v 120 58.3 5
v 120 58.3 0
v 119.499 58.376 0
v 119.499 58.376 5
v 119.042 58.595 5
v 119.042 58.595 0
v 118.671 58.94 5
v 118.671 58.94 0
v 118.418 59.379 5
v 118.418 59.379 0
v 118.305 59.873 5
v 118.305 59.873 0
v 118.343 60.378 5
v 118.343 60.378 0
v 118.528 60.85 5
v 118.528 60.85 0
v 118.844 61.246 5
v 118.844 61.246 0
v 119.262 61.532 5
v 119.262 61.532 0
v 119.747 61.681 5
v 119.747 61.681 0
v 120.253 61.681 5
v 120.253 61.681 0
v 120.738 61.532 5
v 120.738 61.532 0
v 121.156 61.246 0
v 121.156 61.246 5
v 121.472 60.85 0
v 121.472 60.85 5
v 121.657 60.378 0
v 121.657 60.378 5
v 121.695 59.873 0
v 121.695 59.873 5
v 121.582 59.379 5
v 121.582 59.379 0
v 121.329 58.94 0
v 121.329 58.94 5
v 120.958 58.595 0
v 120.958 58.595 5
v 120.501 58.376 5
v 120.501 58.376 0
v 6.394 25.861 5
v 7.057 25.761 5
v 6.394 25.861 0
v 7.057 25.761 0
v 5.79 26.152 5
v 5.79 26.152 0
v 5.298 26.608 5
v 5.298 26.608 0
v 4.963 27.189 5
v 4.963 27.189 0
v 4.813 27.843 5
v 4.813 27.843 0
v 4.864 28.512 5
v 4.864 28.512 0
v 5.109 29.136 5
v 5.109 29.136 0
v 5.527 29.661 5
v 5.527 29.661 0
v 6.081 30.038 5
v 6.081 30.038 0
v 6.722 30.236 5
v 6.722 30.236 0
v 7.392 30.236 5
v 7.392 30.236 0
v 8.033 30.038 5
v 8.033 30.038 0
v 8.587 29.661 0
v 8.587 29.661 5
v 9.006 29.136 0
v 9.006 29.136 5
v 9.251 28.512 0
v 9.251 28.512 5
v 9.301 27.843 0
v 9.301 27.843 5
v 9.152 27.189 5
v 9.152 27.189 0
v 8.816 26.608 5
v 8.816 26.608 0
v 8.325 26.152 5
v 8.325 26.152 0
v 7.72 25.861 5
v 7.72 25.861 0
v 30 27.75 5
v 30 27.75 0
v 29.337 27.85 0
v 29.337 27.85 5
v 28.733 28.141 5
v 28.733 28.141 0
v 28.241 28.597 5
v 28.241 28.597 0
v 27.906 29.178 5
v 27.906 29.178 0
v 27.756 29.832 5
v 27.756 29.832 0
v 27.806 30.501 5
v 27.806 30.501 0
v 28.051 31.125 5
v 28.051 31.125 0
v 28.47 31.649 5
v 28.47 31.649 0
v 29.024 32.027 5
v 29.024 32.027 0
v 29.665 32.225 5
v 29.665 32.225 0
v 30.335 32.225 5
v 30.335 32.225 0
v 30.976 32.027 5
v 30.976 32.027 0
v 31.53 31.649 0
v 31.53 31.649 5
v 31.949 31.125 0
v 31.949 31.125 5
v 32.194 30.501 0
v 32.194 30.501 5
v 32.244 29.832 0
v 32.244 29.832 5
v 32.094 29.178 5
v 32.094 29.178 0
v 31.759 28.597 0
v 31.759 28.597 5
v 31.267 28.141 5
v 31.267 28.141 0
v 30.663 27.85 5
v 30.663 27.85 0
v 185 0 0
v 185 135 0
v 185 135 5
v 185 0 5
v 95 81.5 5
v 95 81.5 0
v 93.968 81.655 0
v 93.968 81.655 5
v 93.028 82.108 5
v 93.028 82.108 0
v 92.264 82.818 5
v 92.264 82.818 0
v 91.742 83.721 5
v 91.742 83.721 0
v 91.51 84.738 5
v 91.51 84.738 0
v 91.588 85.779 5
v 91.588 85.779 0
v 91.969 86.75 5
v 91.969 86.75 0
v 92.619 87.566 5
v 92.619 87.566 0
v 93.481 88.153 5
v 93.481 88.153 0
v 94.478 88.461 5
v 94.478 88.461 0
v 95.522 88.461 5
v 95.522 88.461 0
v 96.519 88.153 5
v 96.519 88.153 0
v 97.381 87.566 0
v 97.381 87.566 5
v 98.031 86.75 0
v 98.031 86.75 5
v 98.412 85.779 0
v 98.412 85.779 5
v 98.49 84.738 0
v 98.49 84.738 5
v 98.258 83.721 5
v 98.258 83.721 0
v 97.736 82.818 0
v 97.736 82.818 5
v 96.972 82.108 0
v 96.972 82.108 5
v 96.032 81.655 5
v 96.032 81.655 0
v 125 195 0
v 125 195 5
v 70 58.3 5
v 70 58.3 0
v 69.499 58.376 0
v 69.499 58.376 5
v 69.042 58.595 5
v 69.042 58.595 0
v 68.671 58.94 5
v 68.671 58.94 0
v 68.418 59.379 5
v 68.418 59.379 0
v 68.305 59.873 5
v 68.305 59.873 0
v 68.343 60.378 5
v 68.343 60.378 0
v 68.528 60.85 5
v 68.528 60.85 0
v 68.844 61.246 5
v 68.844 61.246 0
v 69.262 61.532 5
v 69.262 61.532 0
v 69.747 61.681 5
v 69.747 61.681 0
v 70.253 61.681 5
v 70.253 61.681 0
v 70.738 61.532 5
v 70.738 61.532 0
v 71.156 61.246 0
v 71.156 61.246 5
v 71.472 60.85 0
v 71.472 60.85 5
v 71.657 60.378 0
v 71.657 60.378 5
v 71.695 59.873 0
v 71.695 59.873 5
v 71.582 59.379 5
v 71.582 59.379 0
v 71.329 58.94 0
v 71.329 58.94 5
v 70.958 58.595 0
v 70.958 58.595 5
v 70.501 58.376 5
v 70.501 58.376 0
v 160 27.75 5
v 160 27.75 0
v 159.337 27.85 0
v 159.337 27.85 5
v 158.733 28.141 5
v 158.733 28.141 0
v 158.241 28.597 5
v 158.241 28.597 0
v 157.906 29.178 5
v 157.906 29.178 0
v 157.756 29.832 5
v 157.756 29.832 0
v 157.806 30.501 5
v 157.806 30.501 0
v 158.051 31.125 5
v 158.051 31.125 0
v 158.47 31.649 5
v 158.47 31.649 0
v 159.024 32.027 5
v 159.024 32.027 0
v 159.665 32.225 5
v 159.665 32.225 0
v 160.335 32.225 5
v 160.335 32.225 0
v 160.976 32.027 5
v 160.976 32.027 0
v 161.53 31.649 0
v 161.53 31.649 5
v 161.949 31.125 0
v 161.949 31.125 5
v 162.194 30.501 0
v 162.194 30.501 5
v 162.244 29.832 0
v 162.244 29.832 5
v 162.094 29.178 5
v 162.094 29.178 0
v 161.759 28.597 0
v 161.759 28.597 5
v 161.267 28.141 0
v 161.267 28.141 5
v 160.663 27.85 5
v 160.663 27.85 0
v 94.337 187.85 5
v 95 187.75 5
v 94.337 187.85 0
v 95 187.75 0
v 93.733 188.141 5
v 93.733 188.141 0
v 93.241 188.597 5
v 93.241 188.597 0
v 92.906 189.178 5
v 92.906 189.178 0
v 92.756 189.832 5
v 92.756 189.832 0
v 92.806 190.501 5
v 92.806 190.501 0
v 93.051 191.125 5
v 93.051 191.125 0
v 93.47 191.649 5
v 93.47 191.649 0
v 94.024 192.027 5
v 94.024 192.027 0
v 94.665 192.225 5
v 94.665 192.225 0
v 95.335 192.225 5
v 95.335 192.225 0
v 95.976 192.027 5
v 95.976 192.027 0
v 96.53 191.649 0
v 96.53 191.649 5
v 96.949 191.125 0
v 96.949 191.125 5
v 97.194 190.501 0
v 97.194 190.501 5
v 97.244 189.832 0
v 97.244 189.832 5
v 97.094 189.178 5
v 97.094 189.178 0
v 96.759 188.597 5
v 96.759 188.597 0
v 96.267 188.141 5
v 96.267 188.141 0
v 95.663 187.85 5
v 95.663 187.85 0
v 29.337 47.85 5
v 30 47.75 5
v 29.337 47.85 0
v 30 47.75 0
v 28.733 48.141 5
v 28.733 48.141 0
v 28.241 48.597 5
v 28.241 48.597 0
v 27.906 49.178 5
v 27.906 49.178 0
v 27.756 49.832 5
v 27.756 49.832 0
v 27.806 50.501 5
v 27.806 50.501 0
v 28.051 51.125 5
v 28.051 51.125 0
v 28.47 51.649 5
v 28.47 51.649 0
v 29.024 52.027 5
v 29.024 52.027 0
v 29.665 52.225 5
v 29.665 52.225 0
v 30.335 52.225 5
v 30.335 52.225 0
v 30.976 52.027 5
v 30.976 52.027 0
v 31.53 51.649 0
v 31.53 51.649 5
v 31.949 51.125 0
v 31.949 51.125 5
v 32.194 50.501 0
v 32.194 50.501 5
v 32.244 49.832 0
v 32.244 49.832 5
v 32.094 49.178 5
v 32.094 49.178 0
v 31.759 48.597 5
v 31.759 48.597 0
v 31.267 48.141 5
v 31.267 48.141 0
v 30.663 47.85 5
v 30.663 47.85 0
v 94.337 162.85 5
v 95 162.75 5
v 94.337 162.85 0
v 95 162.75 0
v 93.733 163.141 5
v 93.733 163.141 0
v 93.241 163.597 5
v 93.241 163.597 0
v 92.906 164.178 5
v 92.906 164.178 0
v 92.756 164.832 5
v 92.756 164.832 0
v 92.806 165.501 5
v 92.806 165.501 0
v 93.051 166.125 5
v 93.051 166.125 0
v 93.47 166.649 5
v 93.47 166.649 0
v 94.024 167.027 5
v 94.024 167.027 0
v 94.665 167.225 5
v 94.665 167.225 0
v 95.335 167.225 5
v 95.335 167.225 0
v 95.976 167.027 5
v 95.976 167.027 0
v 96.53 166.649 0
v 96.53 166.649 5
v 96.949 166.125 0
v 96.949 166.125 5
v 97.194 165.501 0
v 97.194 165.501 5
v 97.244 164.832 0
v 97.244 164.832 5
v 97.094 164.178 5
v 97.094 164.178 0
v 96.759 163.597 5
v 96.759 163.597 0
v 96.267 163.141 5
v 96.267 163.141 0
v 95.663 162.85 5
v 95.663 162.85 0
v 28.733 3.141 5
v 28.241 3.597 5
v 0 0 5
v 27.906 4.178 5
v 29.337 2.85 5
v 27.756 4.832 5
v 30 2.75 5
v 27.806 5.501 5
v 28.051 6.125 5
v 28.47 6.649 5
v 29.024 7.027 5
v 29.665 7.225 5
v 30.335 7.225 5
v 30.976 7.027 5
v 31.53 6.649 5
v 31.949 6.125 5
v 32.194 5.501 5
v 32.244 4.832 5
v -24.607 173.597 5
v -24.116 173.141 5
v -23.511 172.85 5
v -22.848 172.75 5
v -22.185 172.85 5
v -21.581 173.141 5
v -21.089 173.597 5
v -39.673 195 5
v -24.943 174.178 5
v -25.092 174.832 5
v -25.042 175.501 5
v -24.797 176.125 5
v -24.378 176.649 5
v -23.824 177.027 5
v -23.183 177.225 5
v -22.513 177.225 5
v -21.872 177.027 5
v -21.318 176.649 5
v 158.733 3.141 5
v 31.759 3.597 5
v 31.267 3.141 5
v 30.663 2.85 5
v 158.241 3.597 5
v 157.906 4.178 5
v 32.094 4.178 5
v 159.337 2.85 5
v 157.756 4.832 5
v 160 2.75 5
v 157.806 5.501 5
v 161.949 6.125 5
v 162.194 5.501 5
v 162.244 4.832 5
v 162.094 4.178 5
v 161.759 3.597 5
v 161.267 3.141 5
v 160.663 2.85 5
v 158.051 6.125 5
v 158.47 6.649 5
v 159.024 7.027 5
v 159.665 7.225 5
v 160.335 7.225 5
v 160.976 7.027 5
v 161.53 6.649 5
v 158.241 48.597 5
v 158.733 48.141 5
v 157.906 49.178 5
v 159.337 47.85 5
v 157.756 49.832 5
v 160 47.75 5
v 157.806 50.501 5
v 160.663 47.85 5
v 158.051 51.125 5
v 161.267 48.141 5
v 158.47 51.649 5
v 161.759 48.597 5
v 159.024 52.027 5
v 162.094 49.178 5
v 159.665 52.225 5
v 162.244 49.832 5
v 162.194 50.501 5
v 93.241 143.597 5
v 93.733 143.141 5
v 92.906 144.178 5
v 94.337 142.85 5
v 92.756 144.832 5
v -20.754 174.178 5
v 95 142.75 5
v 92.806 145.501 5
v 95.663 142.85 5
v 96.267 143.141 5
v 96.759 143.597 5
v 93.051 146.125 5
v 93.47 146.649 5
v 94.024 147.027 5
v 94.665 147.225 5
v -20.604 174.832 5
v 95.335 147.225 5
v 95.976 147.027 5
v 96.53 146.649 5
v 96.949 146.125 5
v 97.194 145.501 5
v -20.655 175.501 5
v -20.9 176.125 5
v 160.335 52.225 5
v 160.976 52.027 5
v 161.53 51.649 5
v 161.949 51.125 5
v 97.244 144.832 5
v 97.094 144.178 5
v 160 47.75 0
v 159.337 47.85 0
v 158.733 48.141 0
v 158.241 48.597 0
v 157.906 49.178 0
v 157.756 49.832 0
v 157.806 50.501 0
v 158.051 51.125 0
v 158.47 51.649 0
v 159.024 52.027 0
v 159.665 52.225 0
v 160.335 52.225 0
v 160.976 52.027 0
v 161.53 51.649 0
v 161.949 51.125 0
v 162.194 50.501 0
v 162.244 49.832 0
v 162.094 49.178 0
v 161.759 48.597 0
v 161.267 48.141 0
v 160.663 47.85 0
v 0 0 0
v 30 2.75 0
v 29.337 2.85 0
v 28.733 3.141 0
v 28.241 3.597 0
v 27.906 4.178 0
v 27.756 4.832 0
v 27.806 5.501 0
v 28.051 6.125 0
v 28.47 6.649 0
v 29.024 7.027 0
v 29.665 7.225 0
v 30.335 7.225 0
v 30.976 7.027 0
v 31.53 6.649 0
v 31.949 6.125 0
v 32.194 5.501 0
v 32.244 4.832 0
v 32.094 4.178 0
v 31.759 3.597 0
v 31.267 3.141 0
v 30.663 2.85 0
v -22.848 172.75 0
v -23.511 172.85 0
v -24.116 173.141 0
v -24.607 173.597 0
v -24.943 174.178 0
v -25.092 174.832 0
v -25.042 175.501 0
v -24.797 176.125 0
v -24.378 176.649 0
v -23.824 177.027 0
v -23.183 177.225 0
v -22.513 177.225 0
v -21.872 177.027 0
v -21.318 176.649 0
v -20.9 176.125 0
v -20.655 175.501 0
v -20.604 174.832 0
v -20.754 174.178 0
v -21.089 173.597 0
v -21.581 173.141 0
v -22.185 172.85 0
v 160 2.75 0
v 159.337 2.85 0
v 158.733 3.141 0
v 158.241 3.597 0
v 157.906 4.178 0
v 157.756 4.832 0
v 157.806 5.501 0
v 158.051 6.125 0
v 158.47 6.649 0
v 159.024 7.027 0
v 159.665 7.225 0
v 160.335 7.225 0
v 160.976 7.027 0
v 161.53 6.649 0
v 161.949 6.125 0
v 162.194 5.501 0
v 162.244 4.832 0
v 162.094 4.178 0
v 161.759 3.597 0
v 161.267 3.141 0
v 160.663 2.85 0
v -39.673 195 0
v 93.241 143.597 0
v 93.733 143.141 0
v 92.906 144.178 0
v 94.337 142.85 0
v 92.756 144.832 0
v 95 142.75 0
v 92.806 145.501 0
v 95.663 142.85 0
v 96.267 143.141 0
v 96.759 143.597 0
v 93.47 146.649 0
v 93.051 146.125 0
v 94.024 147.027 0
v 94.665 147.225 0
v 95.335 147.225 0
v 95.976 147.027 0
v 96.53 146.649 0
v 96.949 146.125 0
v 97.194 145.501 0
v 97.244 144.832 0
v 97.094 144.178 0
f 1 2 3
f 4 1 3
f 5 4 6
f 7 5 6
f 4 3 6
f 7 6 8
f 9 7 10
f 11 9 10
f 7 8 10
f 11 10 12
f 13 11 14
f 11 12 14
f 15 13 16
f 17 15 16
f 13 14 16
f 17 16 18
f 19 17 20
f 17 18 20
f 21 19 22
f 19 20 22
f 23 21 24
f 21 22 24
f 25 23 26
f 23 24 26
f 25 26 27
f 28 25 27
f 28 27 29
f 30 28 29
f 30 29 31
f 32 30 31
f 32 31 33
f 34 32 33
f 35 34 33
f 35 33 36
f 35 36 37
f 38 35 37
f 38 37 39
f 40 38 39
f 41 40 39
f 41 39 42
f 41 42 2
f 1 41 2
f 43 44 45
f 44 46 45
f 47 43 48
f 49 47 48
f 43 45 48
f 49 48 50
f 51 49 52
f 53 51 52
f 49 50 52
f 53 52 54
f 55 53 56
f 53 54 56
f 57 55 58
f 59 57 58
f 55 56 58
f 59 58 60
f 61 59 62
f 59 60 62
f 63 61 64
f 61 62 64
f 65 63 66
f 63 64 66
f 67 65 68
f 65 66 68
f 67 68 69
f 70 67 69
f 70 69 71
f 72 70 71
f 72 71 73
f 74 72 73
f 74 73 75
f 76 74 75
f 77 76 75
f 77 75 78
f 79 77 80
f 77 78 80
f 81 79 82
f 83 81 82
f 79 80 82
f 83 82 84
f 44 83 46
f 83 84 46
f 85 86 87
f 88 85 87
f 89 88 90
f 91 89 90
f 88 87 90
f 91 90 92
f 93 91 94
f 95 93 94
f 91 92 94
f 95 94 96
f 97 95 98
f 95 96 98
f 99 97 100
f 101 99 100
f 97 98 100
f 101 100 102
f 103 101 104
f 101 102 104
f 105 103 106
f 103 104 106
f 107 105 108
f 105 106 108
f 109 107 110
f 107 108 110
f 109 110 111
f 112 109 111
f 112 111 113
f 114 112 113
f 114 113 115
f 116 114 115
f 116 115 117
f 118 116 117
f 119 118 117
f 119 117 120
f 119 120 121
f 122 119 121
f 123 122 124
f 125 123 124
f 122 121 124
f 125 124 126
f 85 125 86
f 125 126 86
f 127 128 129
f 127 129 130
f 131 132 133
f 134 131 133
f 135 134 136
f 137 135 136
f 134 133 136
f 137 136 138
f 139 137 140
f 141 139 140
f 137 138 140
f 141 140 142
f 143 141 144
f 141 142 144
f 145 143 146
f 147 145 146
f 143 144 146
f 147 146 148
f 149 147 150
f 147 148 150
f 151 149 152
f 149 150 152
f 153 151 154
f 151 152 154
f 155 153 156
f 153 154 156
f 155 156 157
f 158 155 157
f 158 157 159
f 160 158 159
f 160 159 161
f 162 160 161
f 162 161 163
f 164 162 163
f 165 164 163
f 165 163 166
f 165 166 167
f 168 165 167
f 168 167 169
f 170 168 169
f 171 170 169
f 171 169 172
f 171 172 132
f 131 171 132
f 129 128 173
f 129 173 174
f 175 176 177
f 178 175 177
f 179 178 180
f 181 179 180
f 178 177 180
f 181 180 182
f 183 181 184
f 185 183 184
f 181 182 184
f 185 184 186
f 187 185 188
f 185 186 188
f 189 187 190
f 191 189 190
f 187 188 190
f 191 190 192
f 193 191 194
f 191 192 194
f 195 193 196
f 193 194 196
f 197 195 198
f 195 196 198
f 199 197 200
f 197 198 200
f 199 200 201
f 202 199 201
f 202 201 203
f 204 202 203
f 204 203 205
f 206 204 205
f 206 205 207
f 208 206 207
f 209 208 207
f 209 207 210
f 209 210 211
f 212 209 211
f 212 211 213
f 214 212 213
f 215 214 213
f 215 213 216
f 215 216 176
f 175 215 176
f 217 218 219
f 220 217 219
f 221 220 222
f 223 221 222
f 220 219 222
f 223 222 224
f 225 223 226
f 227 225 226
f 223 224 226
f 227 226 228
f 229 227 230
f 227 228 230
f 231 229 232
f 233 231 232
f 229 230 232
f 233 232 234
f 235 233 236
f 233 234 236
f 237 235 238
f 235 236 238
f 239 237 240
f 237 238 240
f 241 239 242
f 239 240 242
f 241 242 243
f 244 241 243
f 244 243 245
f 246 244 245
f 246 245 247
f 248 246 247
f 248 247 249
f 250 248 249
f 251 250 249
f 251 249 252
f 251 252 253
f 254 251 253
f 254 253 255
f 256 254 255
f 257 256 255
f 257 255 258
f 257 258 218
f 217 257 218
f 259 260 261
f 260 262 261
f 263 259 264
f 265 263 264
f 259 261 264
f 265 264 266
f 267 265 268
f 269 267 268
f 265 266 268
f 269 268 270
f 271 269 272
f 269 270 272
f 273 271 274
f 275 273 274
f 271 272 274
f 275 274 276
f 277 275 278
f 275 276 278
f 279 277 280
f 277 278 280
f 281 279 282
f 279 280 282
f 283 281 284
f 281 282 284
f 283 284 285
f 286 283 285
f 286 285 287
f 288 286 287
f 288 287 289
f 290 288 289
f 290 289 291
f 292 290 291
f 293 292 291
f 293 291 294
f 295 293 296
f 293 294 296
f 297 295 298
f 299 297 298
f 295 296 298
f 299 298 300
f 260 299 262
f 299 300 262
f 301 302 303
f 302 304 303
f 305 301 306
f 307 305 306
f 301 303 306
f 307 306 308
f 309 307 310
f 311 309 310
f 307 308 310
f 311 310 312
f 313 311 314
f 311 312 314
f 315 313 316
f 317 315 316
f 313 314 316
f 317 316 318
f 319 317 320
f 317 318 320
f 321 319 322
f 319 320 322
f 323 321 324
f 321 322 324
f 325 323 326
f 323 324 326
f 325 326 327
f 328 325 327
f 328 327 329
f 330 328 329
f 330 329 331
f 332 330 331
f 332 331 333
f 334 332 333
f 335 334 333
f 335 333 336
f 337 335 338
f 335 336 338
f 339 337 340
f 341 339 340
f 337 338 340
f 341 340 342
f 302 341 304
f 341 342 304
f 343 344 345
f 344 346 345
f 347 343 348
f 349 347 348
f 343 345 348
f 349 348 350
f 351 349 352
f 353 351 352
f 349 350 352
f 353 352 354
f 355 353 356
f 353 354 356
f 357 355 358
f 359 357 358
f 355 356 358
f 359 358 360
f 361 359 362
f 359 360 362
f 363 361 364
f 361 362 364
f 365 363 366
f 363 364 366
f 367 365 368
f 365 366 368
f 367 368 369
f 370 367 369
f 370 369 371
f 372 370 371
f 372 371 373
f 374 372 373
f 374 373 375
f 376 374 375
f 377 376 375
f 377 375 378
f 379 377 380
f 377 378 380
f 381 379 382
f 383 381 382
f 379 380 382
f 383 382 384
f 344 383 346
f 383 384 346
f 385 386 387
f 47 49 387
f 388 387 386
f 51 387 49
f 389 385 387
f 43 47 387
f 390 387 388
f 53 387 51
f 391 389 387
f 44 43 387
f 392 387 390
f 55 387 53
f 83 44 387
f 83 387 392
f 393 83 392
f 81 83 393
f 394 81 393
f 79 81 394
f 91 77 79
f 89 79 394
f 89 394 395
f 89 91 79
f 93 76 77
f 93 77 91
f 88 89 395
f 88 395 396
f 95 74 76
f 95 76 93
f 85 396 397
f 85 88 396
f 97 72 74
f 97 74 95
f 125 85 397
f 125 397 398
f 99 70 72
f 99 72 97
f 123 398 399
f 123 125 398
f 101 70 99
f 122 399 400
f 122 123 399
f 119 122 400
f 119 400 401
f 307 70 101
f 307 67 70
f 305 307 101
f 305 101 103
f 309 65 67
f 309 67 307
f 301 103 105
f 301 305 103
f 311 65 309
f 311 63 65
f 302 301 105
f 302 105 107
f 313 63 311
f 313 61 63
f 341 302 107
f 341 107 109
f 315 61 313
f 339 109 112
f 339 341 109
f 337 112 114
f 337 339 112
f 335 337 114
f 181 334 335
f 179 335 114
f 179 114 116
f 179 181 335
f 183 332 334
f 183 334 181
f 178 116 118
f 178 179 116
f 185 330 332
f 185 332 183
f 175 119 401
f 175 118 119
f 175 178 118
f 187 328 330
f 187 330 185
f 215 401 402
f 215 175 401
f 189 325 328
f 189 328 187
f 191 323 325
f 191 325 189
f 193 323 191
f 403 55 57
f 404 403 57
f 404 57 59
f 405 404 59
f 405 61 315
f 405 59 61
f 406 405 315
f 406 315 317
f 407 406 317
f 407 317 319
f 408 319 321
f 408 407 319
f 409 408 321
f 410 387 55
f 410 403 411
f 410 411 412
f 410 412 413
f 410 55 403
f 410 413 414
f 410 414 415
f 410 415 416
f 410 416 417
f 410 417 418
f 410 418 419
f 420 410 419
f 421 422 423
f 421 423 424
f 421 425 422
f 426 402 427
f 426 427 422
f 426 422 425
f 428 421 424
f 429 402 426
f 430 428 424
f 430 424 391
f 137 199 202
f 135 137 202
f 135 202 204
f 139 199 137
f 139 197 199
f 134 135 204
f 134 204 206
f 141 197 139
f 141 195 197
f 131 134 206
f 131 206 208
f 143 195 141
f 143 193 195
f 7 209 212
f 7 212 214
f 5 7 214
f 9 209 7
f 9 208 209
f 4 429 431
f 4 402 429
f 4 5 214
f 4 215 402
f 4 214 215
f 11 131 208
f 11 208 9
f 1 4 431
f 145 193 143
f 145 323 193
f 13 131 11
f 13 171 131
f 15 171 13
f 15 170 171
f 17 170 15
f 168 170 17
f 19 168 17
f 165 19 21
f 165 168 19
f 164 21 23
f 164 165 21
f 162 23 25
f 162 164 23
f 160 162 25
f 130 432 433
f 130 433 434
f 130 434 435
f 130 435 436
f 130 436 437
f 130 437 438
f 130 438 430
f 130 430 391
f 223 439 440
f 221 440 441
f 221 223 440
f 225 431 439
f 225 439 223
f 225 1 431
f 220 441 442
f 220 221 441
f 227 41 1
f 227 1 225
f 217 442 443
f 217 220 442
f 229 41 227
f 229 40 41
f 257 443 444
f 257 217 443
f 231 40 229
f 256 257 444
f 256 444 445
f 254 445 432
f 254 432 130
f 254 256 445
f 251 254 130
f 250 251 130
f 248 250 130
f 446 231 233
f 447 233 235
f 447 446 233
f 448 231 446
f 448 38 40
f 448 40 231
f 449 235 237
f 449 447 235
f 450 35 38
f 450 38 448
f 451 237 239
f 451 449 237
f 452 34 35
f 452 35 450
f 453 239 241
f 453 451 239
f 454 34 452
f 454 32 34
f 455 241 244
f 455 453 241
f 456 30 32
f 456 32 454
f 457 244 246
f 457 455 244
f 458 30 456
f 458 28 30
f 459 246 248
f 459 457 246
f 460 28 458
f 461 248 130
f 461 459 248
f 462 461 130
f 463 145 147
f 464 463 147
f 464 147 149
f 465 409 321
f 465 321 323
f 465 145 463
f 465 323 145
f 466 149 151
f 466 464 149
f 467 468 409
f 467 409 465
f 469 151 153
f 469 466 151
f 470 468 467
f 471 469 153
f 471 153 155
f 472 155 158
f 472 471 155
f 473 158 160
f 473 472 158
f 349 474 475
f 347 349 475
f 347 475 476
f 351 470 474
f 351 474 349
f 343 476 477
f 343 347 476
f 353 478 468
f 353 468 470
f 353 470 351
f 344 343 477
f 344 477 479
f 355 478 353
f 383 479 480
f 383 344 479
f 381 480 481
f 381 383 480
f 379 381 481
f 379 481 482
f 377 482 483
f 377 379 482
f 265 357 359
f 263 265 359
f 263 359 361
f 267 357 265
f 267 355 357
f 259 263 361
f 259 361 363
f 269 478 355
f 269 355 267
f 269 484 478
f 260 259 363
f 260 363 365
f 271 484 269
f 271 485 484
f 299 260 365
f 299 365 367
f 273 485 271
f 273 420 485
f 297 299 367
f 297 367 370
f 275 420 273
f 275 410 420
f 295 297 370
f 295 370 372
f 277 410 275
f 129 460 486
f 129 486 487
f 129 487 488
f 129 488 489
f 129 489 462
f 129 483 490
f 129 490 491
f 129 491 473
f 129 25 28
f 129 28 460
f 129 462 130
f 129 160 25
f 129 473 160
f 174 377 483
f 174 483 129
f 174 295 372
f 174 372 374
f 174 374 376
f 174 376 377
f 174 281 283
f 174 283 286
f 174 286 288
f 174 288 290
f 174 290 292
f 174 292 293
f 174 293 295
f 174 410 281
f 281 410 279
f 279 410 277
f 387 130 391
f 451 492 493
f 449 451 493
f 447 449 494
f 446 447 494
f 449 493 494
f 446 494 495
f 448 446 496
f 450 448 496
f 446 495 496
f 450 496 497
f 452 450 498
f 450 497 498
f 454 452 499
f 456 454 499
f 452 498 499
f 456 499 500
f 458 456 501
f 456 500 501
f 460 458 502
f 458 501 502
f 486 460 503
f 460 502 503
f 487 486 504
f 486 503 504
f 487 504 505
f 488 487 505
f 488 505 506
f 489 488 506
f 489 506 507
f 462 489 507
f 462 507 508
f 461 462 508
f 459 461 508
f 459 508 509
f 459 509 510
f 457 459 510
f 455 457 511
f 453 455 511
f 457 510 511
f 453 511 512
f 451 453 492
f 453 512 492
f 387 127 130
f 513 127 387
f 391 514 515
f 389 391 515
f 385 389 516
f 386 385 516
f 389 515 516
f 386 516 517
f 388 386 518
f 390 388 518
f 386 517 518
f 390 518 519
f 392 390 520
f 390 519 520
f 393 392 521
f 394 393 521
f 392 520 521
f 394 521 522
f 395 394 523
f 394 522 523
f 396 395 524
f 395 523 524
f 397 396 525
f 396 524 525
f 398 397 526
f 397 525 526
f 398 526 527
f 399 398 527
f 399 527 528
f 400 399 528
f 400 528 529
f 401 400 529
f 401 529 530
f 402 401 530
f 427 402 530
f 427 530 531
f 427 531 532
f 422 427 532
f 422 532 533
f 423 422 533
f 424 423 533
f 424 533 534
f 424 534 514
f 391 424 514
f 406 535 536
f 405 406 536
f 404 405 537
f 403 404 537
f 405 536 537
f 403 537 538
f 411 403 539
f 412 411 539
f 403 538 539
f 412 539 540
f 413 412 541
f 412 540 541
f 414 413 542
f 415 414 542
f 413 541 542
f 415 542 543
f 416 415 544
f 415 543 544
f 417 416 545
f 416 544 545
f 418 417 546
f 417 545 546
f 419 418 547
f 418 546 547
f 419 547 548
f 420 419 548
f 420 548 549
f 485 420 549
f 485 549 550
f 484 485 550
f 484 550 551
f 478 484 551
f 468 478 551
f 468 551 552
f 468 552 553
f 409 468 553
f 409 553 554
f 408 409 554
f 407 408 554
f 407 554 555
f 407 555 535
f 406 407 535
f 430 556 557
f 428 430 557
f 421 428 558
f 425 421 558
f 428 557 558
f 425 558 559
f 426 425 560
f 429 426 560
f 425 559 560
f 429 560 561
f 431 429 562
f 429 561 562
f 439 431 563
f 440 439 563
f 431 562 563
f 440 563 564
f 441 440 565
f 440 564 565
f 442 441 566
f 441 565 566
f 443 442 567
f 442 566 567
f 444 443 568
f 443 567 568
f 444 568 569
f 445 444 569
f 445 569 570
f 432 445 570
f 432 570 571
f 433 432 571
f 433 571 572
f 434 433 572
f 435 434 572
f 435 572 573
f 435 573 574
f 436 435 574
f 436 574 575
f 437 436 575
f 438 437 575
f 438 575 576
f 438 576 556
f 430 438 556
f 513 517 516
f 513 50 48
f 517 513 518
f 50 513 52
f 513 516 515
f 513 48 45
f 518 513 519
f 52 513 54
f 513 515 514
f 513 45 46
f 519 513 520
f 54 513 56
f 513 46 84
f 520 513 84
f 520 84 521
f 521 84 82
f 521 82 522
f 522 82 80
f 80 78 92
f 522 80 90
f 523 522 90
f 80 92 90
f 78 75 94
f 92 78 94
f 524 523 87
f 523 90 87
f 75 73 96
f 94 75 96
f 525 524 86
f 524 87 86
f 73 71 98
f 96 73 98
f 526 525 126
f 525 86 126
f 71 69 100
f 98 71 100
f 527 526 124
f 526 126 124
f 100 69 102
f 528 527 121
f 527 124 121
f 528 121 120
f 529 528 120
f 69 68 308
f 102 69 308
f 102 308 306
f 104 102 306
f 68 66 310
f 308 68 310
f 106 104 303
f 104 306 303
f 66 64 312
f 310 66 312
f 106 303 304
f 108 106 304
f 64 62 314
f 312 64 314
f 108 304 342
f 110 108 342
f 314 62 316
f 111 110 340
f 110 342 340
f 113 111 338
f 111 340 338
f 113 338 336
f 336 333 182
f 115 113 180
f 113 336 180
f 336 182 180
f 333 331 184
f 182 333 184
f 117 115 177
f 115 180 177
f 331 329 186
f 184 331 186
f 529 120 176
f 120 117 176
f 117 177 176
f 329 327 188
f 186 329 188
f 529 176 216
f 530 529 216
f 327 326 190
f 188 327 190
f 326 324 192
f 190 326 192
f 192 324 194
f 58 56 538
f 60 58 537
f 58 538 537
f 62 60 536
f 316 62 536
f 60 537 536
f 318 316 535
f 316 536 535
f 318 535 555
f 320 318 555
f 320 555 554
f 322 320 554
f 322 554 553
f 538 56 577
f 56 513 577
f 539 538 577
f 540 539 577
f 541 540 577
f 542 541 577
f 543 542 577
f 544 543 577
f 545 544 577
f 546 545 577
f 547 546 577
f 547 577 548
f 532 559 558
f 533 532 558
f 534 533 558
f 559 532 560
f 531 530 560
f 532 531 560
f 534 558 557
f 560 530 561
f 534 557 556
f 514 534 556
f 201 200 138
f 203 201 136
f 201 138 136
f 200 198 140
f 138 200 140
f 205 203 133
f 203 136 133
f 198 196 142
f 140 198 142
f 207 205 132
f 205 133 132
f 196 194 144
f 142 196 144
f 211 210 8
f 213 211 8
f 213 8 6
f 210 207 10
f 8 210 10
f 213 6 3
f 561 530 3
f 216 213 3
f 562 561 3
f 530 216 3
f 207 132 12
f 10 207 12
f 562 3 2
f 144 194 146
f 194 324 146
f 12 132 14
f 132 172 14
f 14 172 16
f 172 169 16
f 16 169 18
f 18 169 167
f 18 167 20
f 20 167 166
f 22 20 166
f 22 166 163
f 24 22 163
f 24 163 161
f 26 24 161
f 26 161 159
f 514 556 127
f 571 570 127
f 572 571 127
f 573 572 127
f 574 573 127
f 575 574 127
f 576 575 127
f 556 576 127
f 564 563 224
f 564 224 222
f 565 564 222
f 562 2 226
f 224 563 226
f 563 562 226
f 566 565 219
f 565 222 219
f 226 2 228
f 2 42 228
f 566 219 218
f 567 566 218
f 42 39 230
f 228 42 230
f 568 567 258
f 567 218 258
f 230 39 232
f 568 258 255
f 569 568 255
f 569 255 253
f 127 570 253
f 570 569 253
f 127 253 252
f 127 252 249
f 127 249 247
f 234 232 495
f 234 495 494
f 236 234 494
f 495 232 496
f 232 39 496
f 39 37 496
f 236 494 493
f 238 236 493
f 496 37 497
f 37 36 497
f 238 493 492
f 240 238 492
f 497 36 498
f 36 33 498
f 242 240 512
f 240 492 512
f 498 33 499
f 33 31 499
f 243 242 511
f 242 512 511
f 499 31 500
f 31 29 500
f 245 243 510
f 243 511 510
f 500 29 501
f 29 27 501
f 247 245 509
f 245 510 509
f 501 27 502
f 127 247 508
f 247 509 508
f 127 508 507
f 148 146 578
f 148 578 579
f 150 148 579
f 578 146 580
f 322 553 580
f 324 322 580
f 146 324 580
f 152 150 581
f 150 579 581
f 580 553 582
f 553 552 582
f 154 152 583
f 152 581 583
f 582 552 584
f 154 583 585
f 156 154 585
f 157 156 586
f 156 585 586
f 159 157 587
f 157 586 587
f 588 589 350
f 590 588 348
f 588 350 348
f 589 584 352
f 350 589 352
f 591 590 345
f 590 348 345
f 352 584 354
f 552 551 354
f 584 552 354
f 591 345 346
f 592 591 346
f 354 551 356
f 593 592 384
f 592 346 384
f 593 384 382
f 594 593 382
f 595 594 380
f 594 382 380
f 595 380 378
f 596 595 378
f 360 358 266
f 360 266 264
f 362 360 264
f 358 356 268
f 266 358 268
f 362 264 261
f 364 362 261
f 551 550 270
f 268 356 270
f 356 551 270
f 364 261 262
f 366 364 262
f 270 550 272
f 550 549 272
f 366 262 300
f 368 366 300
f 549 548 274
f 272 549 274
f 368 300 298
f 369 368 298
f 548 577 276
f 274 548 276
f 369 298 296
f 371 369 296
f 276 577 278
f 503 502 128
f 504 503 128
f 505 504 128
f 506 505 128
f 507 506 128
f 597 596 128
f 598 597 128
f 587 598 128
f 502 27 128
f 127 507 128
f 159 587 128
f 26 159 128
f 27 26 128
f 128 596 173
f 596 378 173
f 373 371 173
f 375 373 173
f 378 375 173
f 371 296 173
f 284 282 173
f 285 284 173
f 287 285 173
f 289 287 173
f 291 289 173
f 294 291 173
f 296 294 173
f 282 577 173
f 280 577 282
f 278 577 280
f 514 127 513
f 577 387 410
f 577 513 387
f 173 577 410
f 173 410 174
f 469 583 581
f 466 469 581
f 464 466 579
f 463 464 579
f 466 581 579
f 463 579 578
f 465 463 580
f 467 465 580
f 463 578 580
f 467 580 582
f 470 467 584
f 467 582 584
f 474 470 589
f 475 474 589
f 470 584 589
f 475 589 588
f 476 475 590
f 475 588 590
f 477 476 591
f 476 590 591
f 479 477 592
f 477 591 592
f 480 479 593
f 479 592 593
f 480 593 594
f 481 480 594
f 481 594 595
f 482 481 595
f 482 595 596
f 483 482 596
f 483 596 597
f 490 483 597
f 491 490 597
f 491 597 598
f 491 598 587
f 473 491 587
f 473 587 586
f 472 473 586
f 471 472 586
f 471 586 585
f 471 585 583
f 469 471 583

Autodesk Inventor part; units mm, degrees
ref_plane "YZ Plane" through (0, 0, 0) normal (1, 0, 0) x (0, 1, 0)
ref_plane "XZ Plane" through (0, 0, 0) normal (0, 1, 0) x (-1, 0, 0)
ref_plane "XY Plane" through (0, 0, 0) normal (0, 0, 1) x (1, 0, 0)
sketch "Sketch1" plane through (0, 0, 0) normal (0, 0, 1) x (1, 0, 0)
  line L0 (0, 0) -> (-39.6732, 195)
  line L1 (-39.6732, 195) -> (185, 195)
  line L2 (185, 195) -> (185, 0)
  line L3 (185, 0) -> (0, 0)
  dimension "d0" = 195
  dimension "d1" = 78.5
  dimension "d2" = 185
extrude "Extrusion1" add sketch "Sketch1" along normal blind 5
sketch "Sketch2" plane through (0, 0, 5) normal (0, 0, 1) x (1, 0, 0)
  line L0 (0, 0) -> (185, 0) projected
  point P0 (95, 165)
  point P1 (95, 145)
  point P2 (30, 50)
  point P3 (30, 30)
  point P4 (160, 50)
  point P5 (160, 30)
  point P6 (95, 190)
  point P7 (30, 5)
  point P8 (160, 5)
  dimension "d5" = 20
  dimension "d7" = 20
  dimension "d15" = 25
  dimension "d16" = 95
  dimension "d20" = 5
  dimension "d21" = 30
  dimension "d89" = 130
  dimension "d90" = 65
  dimension "d91" = 25
hole "Hole1" at (95, 165, 5) at (95, 145, 5) at (30, 50, 5) at (30, 30, 5) at (160, 50, 5) at (160, 30, 5) at (95, 190, 5) at (30, 5, 5) at (160, 5, 5) direction (0, 0, -1) diameter 4.5 end through all clearance for "Flat Head Machine Screw" size "M4" standard "Ansi Metric M Profile"
sketch "Sketch3" plane through (0, 0, 5) normal (0, 0, 1) x (1, 0, 0)
  circle A0 centre (30, 5) radius 2.25 projected
  circle A1 centre (160, 30) radius 2.25 projected
  circle A2 centre (30, 30) radius 2.25 projected
  circle A3 centre (95, 145) radius 2.25 projected
  circle A4 centre (95, 165) radius 2.25 projected
  circle A5 centre (30, 50) radius 2.25 projected
  circle A6 centre (160, 50) radius 2.25 projected
  line L0 (-39.6732, 195) -> (0, 0) projected
  line L1 (0, 0) -> (185, 0) projected
  line L2 (185, 0) -> (185, 195) projected
  line L3 (185, 195) -> (-39.6732, 195) projected
  point P0 (95, 85)
  dimension "d37" = 60
hole "Hole2" at (95, 85, 5) direction (0, 0, -1) diameter 7 end through all
sketch "Sketch4" plane through (0, 0, 5) normal (0, 0, 1) x (1, 0, 0)
  circle A0 centre (95, 85) radius 3.5 projected
  circle A1 centre (30, 5) radius 2.25 projected
  circle A2 centre (160, 30) radius 2.25 projected
  circle A3 centre (30, 30) radius 2.25 projected
  circle A4 centre (95, 145) radius 2.25 projected
  circle A5 centre (95, 165) radius 2.25 projected
  circle A6 centre (30, 50) radius 2.25 projected
  circle A7 centre (160, 50) radius 2.25 projected
  line L0 (-39.6732, 195) -> (0, 0) projected
  line L1 (0, 0) -> (185, 0) projected
  line L2 (185, 0) -> (185, 195) projected
  line L3 (185, 195) -> (-39.6732, 195) projected
  point P0 (120, 60)
  point P1 (70, 60)
  dimension "d46" = 25
  dimension "d47" = 25
  dimension "d48" = 50
hole "Hole3" at (120, 60, 5) at (70, 60, 5) direction (0, 0, -1) diameter 3.4 end through all clearance for "Flat Head Machine Screw" size "M3" standard "Ansi Metric M Profile"
chamfer "Chamfer1" distance 60 angle 45 1 edges at (185, 195, 2.5)
sketch "Sketch5" plane through (0, 0, 5) normal (0, 0, 1) x (1, 0, 0)
  line L0 (-39.6732, 195) -> (0, 0) projected
  line L1 (125, 195) -> (-39.6732, 195) projected
  line L2 (0, 0) -> (185, 0) projected
  point P0 (-22.8481, 175)
  point P1 (7.0571, 28.0113)
  dimension "d64" = 12.5
  dimension "d65" = 12.5
  dimension "d66" = 150
  dimension "d67" = 20
  dimension "d68" = 28.0113
hole "Hole4" at (-22.8481, 175, 5) at (7.0571, 28.0113, 5) direction (0, 0, -1) diameter 4.5 end through all clearance for "Flat Head Machine Screw" size "M4" standard "Ansi Metric M Profile"
sketch "Sketch6" plane through (0, 0, 5) normal (0, 0, 1) x (1, 0, 0)
  circle A0 centre (-22.8481, 175) radius 2.25 projected
  line L0 (125, 195) -> (185, 135) projected
  line L1 (125, 195) -> (-39.6732, 195) projected
  line L2 (-39.6732, 195) -> (0, 0) projected
  line L3 (0, 0) -> (185, 0) projected
  line L4 (185, 0) -> (185, 135) projected
  circle A1 centre (120, 60) radius 1.7 projected
  circle A2 centre (70, 60) radius 1.7 projected
  circle A3 centre (95, 85) radius 3.5 projected
  circle A4 centre (30, 5) radius 2.25 projected
  circle A5 centre (160, 30) radius 2.25 projected
  circle A6 centre (30, 30) radius 2.25 projected
  circle A7 centre (30, 50) radius 2.25 projected
  circle A8 centre (160, 50) radius 2.25 projected
  circle A9 centre (160, 5) radius 2.25 projected
  point P0 (30.4041, 55)
  point P1 (50, 59)
  point P2 (140, 59)
  point P3 (159.5959, 55)
  dimension "d76" = 20
  dimension "d77" = 4
  dimension "d78" = 20
  dimension "d79" = 45
  dimension "d80" = 26
  dimension "d81" = 45
hole "Hole5" [suppressed]
equation "\"d5\" = d6"
equation "\"d7\" = d5"
equation "\"d90\" = 0.5 * d89"
equation "\"d48\" = 2 * d47"
equation "\"d65\" = d64"
equation "\"d78\" = d76"
equation "\"d81\" = d79"
equation "\"d6\" = 20"
properties part number "Top_Separator Backboard 2 Lanes" material "PMMA Plastic"
